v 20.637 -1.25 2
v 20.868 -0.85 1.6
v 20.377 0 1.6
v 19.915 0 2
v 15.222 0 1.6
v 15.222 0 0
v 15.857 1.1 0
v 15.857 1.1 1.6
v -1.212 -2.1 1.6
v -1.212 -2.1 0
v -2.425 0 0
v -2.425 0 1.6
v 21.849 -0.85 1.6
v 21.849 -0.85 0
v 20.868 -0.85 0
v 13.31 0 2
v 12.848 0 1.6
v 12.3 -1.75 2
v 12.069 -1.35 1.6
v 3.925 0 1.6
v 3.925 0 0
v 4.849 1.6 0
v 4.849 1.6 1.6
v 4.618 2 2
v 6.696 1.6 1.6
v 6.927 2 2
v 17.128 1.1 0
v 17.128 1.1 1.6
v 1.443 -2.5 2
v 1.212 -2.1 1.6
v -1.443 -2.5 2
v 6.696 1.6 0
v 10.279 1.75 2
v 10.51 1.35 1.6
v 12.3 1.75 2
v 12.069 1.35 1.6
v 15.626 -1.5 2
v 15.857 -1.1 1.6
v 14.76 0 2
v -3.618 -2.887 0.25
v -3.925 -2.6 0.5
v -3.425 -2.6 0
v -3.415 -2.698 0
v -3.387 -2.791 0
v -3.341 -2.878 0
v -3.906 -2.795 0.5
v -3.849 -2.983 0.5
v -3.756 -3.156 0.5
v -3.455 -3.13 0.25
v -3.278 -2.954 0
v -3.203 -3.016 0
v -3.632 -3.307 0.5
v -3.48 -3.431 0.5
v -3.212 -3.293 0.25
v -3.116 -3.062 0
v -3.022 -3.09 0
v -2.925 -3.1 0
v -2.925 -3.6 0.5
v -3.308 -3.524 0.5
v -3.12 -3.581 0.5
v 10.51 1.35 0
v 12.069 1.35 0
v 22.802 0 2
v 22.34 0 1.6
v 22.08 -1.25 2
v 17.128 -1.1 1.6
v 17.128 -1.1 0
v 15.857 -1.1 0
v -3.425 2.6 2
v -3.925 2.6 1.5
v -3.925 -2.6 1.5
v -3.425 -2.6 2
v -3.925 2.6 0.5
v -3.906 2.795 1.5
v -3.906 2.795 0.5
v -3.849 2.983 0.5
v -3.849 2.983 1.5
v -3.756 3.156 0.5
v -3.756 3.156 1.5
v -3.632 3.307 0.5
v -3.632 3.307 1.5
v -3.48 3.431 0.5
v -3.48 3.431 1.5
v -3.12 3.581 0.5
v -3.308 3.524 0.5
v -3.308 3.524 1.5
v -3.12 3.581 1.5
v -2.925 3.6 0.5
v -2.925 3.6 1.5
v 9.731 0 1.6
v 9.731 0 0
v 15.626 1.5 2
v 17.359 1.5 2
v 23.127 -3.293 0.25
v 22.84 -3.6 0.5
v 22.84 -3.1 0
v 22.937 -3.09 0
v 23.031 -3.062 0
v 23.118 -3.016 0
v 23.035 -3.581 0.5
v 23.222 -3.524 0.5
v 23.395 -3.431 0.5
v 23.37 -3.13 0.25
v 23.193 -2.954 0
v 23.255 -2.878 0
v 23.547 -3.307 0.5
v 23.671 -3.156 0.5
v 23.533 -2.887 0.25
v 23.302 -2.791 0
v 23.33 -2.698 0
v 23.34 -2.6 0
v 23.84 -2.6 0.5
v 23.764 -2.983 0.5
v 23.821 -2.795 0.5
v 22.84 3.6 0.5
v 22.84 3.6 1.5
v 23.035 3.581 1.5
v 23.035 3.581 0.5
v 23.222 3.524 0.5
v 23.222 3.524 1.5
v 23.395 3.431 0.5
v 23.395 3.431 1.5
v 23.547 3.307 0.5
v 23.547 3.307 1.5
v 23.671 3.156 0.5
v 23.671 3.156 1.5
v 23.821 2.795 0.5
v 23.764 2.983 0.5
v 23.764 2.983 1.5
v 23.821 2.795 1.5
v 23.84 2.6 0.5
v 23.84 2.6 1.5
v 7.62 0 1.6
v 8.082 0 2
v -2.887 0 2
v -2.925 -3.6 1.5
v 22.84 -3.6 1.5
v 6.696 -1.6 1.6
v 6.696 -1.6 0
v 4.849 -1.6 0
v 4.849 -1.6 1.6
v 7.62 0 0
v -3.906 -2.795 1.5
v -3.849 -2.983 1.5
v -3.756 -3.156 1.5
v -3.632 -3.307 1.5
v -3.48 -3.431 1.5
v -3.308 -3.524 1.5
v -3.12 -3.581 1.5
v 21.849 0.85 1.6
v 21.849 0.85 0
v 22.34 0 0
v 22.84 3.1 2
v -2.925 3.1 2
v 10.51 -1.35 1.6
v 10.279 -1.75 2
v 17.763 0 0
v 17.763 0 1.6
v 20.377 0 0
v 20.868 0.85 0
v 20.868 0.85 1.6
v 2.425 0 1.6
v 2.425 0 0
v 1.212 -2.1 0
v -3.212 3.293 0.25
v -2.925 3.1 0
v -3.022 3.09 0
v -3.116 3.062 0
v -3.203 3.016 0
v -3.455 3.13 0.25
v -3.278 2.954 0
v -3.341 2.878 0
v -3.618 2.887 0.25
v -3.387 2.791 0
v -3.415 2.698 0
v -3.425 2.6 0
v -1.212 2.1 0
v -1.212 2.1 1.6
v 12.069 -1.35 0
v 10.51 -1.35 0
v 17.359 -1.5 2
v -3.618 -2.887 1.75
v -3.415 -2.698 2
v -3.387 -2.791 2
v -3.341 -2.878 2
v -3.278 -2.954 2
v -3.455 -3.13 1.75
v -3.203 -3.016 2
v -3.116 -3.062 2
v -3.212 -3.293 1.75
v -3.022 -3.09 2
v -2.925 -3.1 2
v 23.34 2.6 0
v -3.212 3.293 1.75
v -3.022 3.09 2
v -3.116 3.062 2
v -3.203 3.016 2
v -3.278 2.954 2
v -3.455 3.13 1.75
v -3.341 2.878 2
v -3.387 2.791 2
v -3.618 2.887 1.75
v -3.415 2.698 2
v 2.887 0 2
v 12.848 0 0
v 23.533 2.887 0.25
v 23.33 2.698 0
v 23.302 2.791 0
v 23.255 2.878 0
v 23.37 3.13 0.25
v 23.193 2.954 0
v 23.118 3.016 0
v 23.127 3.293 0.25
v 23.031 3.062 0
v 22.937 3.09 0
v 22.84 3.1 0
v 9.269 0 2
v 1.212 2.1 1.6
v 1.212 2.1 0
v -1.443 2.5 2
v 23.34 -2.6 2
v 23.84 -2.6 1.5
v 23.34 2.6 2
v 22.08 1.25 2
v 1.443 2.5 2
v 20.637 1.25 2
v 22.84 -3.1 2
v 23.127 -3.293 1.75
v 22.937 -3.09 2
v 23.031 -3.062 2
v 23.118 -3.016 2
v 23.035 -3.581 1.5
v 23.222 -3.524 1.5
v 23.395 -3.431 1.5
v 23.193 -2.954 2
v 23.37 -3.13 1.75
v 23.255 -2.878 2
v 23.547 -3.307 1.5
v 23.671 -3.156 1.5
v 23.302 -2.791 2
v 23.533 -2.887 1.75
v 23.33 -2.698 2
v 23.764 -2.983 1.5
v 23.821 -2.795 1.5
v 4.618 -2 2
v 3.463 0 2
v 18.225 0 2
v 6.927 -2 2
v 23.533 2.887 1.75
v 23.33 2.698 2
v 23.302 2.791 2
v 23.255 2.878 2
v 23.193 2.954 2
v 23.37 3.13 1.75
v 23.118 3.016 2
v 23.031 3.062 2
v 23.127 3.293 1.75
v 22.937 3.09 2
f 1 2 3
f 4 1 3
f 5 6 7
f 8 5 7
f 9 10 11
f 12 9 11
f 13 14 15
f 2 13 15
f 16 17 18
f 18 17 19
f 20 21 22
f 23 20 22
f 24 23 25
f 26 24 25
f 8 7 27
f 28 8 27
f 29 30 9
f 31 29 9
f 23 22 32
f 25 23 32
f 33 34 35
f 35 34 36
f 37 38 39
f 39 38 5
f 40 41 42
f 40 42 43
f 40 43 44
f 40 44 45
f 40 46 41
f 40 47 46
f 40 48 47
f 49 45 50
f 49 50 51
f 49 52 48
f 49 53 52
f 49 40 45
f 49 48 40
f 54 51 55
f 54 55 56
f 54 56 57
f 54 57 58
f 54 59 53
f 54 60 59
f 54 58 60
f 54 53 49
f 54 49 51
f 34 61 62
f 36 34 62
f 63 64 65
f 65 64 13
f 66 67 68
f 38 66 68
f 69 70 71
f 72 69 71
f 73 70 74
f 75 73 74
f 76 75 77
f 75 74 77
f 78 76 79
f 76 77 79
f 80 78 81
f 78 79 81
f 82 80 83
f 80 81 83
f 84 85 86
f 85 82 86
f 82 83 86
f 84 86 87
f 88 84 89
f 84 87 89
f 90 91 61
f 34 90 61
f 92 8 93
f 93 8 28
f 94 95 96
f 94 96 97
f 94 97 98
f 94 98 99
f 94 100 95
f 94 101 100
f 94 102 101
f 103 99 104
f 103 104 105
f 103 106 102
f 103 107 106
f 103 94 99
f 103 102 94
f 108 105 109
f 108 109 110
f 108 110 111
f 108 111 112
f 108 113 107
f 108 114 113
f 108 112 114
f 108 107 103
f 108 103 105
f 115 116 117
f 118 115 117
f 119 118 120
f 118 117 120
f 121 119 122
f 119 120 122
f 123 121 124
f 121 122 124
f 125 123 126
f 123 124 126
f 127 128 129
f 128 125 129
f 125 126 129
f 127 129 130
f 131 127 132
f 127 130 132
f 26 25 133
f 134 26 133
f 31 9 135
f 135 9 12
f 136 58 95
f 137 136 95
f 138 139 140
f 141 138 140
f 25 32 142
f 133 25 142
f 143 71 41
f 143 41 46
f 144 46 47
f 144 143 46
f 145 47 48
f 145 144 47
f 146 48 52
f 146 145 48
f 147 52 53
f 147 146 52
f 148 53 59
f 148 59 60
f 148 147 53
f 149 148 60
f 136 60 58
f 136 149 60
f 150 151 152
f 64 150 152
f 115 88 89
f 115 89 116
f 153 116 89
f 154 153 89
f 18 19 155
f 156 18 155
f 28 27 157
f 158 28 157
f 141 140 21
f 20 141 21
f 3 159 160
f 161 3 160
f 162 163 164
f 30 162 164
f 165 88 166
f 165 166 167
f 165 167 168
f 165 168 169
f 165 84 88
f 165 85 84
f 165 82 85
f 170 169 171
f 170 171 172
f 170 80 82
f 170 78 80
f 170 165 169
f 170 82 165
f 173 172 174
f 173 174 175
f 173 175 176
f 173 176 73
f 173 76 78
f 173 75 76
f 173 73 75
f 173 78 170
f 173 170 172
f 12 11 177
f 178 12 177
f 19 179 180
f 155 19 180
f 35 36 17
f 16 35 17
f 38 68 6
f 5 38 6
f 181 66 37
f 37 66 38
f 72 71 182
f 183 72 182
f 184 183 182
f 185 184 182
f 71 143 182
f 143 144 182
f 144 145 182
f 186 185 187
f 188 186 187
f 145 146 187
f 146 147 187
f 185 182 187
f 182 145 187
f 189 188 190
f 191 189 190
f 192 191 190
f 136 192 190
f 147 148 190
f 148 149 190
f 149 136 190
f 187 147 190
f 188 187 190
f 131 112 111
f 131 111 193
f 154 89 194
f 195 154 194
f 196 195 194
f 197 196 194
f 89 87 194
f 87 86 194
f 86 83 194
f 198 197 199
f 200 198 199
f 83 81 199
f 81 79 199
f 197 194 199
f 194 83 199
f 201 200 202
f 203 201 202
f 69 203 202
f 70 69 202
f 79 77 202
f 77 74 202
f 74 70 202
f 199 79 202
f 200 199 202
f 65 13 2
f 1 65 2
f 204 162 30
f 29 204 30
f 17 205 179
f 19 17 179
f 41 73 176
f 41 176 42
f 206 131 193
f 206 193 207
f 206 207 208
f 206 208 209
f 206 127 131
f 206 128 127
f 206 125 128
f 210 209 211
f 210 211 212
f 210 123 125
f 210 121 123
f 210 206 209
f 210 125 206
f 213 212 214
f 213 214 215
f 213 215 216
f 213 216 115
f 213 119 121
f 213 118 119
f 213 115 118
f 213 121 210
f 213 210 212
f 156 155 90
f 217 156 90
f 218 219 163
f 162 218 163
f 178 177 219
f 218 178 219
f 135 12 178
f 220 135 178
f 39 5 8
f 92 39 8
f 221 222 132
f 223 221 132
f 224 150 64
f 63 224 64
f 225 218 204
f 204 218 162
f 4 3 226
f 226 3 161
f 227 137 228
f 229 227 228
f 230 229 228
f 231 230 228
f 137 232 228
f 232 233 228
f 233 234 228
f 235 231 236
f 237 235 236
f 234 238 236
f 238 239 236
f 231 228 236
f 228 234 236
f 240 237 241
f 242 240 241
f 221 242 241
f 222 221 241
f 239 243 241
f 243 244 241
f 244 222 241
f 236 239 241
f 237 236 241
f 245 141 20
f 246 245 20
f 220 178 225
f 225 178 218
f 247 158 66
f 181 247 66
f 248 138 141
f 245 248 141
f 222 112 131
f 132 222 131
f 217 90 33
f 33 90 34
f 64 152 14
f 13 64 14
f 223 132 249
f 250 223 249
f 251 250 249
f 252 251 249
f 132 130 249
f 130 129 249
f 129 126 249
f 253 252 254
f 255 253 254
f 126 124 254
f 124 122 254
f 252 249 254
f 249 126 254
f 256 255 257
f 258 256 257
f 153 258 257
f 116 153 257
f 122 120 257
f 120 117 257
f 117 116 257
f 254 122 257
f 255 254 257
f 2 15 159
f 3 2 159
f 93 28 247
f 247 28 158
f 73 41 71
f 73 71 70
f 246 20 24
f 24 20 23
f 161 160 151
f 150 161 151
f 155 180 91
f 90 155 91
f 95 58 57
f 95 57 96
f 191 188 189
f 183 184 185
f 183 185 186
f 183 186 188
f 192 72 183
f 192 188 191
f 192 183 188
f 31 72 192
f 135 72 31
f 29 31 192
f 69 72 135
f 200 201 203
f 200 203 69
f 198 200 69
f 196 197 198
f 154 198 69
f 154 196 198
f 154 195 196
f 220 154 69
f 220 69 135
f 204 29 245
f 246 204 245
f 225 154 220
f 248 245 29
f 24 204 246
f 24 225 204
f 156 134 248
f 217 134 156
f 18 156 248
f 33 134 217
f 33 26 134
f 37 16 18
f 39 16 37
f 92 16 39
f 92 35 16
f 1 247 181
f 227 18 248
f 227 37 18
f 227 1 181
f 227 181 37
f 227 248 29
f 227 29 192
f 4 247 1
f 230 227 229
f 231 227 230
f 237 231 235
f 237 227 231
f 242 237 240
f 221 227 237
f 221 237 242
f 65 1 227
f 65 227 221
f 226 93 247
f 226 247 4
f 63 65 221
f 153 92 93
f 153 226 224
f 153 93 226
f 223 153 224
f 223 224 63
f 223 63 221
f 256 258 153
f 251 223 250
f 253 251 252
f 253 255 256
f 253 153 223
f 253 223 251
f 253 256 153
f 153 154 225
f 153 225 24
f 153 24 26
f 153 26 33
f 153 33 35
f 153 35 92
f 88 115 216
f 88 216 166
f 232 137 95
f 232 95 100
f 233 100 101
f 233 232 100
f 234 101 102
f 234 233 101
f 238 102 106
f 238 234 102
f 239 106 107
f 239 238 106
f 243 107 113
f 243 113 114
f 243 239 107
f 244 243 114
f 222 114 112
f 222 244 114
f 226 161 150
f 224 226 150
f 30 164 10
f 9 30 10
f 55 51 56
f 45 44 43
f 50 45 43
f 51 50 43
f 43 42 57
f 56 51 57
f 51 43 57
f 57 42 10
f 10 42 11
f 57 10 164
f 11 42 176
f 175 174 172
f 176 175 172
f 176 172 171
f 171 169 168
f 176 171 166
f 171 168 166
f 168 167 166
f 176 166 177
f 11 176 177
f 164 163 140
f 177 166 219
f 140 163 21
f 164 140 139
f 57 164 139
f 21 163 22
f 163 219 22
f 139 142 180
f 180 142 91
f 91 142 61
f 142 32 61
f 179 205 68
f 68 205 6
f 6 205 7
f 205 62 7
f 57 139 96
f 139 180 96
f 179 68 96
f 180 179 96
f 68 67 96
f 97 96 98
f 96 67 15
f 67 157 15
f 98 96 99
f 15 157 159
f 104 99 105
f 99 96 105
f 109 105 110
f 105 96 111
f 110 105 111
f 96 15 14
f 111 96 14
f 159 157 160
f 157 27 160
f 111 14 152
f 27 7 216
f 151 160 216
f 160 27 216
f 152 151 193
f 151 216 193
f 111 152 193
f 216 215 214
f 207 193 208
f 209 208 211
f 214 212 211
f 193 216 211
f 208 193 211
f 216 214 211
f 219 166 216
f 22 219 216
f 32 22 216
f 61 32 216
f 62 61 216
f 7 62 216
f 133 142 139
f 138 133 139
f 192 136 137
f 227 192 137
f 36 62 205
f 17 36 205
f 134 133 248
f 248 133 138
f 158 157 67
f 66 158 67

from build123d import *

# Parameters (mm, degrees)
F0_W     = 27.764633
F0_H     = 7.2
F1_DEPTH = 2
F2_R     = 1
F3_SIZE  = 0.5
F4_SIZE  = 0.4


with BuildPart() as f1:
    # F0 (on Top) → F1 (new body)
    with BuildSketch(Plane.XY):
        with Locations((9.957446, 0)):
            Rectangle(F0_W, F0_H)
        Polygon((2.424871, 0), (1.212436, -2.1), (-1.212436, -2.1), (-2.424871, 0), (-1.212436, 2.1), (1.212436, 2.1), align=None, mode=Mode.SUBTRACT)
        Polygon((7.619913, 0), (6.696152, -1.6), (4.848632, -1.6), (3.924871, 0), (4.848632, 1.6), (6.696152, 1.6), align=None, mode=Mode.SUBTRACT)
        Polygon((12.848198, 0), (12.068775, -1.35), (10.50993, -1.35), (9.730507, 0), (10.50993, 1.35), (12.068775, 1.35), align=None, mode=Mode.SUBTRACT)
        Polygon((17.762655, 0), (17.12757, -1.1), (15.857399, -1.1), (15.222314, 0), (15.857399, 1.1), (17.12757, 1.1), align=None, mode=Mode.SUBTRACT)
        Polygon((22.339762, 0), (21.849014, -0.85), (20.867519, -0.85), (20.376771, 0), (20.867519, 0.85), (21.849014, 0.85), align=None, mode=Mode.SUBTRACT)
    extrude(amount=F1_DEPTH)

    # F2
    f2_edges = [f1.edges().sort_by_distance(p)[0] for p in [
        (-3.924871, -3.6, 1),
        (23.839762, -3.6, 1),
        (23.839762, 3.6, 1),
        (-3.924871, 3.6, 1),
    ]]
    fillet(f2_edges, radius=F2_R)

    # F3
    f3_edges = [f1.edges().sort_by_distance(p)[0] for p in [
        (9.957445, -3.6, 0),
        (9.957445, -3.6, 2),
    ]]
    chamfer(f3_edges, length=F3_SIZE)

    # F4
    f4_edges = [f1.edges().sort_by_distance(p)[0] for p in [
        (-1.818653, -1.05, 2),
        (-1.818653, 1.05, 2),
        (0, 2.1, 2),
        (1.818653, 1.05, 2),
        (1.818653, -1.05, 2),
        (0, -2.1, 2),
        (4.386751, -0.8, 2),
        (4.386751, 0.8, 2),
        (5.772392, 1.6, 2),
        (7.158033, 0.8, 2),
        (7.158033, -0.8, 2),
        (5.772392, -1.6, 2),
        (11.289353, -1.35, 2),
        (10.120218, -0.675, 2),
        (10.120218, 0.675, 2),
        (11.289353, 1.35, 2),
        (12.458487, 0.675, 2),
        (12.458487, -0.675, 2),
        (15.539857, -0.55, 2),
        (15.539857, 0.55, 2),
        (16.492485, 1.1, 2),
        (17.445113, 0.55, 2),
        (17.445113, -0.55, 2),
        (16.492485, -1.1, 2),
        (21.358266, -0.85, 2),
        (20.622145, -0.425, 2),
        (20.622145, 0.425, 2),
        (21.358266, 0.85, 2),
        (22.094388, 0.425, 2),
        (22.094388, -0.425, 2),
    ]]
    chamfer(f4_edges, length=F4_SIZE)


solid = f1.part
